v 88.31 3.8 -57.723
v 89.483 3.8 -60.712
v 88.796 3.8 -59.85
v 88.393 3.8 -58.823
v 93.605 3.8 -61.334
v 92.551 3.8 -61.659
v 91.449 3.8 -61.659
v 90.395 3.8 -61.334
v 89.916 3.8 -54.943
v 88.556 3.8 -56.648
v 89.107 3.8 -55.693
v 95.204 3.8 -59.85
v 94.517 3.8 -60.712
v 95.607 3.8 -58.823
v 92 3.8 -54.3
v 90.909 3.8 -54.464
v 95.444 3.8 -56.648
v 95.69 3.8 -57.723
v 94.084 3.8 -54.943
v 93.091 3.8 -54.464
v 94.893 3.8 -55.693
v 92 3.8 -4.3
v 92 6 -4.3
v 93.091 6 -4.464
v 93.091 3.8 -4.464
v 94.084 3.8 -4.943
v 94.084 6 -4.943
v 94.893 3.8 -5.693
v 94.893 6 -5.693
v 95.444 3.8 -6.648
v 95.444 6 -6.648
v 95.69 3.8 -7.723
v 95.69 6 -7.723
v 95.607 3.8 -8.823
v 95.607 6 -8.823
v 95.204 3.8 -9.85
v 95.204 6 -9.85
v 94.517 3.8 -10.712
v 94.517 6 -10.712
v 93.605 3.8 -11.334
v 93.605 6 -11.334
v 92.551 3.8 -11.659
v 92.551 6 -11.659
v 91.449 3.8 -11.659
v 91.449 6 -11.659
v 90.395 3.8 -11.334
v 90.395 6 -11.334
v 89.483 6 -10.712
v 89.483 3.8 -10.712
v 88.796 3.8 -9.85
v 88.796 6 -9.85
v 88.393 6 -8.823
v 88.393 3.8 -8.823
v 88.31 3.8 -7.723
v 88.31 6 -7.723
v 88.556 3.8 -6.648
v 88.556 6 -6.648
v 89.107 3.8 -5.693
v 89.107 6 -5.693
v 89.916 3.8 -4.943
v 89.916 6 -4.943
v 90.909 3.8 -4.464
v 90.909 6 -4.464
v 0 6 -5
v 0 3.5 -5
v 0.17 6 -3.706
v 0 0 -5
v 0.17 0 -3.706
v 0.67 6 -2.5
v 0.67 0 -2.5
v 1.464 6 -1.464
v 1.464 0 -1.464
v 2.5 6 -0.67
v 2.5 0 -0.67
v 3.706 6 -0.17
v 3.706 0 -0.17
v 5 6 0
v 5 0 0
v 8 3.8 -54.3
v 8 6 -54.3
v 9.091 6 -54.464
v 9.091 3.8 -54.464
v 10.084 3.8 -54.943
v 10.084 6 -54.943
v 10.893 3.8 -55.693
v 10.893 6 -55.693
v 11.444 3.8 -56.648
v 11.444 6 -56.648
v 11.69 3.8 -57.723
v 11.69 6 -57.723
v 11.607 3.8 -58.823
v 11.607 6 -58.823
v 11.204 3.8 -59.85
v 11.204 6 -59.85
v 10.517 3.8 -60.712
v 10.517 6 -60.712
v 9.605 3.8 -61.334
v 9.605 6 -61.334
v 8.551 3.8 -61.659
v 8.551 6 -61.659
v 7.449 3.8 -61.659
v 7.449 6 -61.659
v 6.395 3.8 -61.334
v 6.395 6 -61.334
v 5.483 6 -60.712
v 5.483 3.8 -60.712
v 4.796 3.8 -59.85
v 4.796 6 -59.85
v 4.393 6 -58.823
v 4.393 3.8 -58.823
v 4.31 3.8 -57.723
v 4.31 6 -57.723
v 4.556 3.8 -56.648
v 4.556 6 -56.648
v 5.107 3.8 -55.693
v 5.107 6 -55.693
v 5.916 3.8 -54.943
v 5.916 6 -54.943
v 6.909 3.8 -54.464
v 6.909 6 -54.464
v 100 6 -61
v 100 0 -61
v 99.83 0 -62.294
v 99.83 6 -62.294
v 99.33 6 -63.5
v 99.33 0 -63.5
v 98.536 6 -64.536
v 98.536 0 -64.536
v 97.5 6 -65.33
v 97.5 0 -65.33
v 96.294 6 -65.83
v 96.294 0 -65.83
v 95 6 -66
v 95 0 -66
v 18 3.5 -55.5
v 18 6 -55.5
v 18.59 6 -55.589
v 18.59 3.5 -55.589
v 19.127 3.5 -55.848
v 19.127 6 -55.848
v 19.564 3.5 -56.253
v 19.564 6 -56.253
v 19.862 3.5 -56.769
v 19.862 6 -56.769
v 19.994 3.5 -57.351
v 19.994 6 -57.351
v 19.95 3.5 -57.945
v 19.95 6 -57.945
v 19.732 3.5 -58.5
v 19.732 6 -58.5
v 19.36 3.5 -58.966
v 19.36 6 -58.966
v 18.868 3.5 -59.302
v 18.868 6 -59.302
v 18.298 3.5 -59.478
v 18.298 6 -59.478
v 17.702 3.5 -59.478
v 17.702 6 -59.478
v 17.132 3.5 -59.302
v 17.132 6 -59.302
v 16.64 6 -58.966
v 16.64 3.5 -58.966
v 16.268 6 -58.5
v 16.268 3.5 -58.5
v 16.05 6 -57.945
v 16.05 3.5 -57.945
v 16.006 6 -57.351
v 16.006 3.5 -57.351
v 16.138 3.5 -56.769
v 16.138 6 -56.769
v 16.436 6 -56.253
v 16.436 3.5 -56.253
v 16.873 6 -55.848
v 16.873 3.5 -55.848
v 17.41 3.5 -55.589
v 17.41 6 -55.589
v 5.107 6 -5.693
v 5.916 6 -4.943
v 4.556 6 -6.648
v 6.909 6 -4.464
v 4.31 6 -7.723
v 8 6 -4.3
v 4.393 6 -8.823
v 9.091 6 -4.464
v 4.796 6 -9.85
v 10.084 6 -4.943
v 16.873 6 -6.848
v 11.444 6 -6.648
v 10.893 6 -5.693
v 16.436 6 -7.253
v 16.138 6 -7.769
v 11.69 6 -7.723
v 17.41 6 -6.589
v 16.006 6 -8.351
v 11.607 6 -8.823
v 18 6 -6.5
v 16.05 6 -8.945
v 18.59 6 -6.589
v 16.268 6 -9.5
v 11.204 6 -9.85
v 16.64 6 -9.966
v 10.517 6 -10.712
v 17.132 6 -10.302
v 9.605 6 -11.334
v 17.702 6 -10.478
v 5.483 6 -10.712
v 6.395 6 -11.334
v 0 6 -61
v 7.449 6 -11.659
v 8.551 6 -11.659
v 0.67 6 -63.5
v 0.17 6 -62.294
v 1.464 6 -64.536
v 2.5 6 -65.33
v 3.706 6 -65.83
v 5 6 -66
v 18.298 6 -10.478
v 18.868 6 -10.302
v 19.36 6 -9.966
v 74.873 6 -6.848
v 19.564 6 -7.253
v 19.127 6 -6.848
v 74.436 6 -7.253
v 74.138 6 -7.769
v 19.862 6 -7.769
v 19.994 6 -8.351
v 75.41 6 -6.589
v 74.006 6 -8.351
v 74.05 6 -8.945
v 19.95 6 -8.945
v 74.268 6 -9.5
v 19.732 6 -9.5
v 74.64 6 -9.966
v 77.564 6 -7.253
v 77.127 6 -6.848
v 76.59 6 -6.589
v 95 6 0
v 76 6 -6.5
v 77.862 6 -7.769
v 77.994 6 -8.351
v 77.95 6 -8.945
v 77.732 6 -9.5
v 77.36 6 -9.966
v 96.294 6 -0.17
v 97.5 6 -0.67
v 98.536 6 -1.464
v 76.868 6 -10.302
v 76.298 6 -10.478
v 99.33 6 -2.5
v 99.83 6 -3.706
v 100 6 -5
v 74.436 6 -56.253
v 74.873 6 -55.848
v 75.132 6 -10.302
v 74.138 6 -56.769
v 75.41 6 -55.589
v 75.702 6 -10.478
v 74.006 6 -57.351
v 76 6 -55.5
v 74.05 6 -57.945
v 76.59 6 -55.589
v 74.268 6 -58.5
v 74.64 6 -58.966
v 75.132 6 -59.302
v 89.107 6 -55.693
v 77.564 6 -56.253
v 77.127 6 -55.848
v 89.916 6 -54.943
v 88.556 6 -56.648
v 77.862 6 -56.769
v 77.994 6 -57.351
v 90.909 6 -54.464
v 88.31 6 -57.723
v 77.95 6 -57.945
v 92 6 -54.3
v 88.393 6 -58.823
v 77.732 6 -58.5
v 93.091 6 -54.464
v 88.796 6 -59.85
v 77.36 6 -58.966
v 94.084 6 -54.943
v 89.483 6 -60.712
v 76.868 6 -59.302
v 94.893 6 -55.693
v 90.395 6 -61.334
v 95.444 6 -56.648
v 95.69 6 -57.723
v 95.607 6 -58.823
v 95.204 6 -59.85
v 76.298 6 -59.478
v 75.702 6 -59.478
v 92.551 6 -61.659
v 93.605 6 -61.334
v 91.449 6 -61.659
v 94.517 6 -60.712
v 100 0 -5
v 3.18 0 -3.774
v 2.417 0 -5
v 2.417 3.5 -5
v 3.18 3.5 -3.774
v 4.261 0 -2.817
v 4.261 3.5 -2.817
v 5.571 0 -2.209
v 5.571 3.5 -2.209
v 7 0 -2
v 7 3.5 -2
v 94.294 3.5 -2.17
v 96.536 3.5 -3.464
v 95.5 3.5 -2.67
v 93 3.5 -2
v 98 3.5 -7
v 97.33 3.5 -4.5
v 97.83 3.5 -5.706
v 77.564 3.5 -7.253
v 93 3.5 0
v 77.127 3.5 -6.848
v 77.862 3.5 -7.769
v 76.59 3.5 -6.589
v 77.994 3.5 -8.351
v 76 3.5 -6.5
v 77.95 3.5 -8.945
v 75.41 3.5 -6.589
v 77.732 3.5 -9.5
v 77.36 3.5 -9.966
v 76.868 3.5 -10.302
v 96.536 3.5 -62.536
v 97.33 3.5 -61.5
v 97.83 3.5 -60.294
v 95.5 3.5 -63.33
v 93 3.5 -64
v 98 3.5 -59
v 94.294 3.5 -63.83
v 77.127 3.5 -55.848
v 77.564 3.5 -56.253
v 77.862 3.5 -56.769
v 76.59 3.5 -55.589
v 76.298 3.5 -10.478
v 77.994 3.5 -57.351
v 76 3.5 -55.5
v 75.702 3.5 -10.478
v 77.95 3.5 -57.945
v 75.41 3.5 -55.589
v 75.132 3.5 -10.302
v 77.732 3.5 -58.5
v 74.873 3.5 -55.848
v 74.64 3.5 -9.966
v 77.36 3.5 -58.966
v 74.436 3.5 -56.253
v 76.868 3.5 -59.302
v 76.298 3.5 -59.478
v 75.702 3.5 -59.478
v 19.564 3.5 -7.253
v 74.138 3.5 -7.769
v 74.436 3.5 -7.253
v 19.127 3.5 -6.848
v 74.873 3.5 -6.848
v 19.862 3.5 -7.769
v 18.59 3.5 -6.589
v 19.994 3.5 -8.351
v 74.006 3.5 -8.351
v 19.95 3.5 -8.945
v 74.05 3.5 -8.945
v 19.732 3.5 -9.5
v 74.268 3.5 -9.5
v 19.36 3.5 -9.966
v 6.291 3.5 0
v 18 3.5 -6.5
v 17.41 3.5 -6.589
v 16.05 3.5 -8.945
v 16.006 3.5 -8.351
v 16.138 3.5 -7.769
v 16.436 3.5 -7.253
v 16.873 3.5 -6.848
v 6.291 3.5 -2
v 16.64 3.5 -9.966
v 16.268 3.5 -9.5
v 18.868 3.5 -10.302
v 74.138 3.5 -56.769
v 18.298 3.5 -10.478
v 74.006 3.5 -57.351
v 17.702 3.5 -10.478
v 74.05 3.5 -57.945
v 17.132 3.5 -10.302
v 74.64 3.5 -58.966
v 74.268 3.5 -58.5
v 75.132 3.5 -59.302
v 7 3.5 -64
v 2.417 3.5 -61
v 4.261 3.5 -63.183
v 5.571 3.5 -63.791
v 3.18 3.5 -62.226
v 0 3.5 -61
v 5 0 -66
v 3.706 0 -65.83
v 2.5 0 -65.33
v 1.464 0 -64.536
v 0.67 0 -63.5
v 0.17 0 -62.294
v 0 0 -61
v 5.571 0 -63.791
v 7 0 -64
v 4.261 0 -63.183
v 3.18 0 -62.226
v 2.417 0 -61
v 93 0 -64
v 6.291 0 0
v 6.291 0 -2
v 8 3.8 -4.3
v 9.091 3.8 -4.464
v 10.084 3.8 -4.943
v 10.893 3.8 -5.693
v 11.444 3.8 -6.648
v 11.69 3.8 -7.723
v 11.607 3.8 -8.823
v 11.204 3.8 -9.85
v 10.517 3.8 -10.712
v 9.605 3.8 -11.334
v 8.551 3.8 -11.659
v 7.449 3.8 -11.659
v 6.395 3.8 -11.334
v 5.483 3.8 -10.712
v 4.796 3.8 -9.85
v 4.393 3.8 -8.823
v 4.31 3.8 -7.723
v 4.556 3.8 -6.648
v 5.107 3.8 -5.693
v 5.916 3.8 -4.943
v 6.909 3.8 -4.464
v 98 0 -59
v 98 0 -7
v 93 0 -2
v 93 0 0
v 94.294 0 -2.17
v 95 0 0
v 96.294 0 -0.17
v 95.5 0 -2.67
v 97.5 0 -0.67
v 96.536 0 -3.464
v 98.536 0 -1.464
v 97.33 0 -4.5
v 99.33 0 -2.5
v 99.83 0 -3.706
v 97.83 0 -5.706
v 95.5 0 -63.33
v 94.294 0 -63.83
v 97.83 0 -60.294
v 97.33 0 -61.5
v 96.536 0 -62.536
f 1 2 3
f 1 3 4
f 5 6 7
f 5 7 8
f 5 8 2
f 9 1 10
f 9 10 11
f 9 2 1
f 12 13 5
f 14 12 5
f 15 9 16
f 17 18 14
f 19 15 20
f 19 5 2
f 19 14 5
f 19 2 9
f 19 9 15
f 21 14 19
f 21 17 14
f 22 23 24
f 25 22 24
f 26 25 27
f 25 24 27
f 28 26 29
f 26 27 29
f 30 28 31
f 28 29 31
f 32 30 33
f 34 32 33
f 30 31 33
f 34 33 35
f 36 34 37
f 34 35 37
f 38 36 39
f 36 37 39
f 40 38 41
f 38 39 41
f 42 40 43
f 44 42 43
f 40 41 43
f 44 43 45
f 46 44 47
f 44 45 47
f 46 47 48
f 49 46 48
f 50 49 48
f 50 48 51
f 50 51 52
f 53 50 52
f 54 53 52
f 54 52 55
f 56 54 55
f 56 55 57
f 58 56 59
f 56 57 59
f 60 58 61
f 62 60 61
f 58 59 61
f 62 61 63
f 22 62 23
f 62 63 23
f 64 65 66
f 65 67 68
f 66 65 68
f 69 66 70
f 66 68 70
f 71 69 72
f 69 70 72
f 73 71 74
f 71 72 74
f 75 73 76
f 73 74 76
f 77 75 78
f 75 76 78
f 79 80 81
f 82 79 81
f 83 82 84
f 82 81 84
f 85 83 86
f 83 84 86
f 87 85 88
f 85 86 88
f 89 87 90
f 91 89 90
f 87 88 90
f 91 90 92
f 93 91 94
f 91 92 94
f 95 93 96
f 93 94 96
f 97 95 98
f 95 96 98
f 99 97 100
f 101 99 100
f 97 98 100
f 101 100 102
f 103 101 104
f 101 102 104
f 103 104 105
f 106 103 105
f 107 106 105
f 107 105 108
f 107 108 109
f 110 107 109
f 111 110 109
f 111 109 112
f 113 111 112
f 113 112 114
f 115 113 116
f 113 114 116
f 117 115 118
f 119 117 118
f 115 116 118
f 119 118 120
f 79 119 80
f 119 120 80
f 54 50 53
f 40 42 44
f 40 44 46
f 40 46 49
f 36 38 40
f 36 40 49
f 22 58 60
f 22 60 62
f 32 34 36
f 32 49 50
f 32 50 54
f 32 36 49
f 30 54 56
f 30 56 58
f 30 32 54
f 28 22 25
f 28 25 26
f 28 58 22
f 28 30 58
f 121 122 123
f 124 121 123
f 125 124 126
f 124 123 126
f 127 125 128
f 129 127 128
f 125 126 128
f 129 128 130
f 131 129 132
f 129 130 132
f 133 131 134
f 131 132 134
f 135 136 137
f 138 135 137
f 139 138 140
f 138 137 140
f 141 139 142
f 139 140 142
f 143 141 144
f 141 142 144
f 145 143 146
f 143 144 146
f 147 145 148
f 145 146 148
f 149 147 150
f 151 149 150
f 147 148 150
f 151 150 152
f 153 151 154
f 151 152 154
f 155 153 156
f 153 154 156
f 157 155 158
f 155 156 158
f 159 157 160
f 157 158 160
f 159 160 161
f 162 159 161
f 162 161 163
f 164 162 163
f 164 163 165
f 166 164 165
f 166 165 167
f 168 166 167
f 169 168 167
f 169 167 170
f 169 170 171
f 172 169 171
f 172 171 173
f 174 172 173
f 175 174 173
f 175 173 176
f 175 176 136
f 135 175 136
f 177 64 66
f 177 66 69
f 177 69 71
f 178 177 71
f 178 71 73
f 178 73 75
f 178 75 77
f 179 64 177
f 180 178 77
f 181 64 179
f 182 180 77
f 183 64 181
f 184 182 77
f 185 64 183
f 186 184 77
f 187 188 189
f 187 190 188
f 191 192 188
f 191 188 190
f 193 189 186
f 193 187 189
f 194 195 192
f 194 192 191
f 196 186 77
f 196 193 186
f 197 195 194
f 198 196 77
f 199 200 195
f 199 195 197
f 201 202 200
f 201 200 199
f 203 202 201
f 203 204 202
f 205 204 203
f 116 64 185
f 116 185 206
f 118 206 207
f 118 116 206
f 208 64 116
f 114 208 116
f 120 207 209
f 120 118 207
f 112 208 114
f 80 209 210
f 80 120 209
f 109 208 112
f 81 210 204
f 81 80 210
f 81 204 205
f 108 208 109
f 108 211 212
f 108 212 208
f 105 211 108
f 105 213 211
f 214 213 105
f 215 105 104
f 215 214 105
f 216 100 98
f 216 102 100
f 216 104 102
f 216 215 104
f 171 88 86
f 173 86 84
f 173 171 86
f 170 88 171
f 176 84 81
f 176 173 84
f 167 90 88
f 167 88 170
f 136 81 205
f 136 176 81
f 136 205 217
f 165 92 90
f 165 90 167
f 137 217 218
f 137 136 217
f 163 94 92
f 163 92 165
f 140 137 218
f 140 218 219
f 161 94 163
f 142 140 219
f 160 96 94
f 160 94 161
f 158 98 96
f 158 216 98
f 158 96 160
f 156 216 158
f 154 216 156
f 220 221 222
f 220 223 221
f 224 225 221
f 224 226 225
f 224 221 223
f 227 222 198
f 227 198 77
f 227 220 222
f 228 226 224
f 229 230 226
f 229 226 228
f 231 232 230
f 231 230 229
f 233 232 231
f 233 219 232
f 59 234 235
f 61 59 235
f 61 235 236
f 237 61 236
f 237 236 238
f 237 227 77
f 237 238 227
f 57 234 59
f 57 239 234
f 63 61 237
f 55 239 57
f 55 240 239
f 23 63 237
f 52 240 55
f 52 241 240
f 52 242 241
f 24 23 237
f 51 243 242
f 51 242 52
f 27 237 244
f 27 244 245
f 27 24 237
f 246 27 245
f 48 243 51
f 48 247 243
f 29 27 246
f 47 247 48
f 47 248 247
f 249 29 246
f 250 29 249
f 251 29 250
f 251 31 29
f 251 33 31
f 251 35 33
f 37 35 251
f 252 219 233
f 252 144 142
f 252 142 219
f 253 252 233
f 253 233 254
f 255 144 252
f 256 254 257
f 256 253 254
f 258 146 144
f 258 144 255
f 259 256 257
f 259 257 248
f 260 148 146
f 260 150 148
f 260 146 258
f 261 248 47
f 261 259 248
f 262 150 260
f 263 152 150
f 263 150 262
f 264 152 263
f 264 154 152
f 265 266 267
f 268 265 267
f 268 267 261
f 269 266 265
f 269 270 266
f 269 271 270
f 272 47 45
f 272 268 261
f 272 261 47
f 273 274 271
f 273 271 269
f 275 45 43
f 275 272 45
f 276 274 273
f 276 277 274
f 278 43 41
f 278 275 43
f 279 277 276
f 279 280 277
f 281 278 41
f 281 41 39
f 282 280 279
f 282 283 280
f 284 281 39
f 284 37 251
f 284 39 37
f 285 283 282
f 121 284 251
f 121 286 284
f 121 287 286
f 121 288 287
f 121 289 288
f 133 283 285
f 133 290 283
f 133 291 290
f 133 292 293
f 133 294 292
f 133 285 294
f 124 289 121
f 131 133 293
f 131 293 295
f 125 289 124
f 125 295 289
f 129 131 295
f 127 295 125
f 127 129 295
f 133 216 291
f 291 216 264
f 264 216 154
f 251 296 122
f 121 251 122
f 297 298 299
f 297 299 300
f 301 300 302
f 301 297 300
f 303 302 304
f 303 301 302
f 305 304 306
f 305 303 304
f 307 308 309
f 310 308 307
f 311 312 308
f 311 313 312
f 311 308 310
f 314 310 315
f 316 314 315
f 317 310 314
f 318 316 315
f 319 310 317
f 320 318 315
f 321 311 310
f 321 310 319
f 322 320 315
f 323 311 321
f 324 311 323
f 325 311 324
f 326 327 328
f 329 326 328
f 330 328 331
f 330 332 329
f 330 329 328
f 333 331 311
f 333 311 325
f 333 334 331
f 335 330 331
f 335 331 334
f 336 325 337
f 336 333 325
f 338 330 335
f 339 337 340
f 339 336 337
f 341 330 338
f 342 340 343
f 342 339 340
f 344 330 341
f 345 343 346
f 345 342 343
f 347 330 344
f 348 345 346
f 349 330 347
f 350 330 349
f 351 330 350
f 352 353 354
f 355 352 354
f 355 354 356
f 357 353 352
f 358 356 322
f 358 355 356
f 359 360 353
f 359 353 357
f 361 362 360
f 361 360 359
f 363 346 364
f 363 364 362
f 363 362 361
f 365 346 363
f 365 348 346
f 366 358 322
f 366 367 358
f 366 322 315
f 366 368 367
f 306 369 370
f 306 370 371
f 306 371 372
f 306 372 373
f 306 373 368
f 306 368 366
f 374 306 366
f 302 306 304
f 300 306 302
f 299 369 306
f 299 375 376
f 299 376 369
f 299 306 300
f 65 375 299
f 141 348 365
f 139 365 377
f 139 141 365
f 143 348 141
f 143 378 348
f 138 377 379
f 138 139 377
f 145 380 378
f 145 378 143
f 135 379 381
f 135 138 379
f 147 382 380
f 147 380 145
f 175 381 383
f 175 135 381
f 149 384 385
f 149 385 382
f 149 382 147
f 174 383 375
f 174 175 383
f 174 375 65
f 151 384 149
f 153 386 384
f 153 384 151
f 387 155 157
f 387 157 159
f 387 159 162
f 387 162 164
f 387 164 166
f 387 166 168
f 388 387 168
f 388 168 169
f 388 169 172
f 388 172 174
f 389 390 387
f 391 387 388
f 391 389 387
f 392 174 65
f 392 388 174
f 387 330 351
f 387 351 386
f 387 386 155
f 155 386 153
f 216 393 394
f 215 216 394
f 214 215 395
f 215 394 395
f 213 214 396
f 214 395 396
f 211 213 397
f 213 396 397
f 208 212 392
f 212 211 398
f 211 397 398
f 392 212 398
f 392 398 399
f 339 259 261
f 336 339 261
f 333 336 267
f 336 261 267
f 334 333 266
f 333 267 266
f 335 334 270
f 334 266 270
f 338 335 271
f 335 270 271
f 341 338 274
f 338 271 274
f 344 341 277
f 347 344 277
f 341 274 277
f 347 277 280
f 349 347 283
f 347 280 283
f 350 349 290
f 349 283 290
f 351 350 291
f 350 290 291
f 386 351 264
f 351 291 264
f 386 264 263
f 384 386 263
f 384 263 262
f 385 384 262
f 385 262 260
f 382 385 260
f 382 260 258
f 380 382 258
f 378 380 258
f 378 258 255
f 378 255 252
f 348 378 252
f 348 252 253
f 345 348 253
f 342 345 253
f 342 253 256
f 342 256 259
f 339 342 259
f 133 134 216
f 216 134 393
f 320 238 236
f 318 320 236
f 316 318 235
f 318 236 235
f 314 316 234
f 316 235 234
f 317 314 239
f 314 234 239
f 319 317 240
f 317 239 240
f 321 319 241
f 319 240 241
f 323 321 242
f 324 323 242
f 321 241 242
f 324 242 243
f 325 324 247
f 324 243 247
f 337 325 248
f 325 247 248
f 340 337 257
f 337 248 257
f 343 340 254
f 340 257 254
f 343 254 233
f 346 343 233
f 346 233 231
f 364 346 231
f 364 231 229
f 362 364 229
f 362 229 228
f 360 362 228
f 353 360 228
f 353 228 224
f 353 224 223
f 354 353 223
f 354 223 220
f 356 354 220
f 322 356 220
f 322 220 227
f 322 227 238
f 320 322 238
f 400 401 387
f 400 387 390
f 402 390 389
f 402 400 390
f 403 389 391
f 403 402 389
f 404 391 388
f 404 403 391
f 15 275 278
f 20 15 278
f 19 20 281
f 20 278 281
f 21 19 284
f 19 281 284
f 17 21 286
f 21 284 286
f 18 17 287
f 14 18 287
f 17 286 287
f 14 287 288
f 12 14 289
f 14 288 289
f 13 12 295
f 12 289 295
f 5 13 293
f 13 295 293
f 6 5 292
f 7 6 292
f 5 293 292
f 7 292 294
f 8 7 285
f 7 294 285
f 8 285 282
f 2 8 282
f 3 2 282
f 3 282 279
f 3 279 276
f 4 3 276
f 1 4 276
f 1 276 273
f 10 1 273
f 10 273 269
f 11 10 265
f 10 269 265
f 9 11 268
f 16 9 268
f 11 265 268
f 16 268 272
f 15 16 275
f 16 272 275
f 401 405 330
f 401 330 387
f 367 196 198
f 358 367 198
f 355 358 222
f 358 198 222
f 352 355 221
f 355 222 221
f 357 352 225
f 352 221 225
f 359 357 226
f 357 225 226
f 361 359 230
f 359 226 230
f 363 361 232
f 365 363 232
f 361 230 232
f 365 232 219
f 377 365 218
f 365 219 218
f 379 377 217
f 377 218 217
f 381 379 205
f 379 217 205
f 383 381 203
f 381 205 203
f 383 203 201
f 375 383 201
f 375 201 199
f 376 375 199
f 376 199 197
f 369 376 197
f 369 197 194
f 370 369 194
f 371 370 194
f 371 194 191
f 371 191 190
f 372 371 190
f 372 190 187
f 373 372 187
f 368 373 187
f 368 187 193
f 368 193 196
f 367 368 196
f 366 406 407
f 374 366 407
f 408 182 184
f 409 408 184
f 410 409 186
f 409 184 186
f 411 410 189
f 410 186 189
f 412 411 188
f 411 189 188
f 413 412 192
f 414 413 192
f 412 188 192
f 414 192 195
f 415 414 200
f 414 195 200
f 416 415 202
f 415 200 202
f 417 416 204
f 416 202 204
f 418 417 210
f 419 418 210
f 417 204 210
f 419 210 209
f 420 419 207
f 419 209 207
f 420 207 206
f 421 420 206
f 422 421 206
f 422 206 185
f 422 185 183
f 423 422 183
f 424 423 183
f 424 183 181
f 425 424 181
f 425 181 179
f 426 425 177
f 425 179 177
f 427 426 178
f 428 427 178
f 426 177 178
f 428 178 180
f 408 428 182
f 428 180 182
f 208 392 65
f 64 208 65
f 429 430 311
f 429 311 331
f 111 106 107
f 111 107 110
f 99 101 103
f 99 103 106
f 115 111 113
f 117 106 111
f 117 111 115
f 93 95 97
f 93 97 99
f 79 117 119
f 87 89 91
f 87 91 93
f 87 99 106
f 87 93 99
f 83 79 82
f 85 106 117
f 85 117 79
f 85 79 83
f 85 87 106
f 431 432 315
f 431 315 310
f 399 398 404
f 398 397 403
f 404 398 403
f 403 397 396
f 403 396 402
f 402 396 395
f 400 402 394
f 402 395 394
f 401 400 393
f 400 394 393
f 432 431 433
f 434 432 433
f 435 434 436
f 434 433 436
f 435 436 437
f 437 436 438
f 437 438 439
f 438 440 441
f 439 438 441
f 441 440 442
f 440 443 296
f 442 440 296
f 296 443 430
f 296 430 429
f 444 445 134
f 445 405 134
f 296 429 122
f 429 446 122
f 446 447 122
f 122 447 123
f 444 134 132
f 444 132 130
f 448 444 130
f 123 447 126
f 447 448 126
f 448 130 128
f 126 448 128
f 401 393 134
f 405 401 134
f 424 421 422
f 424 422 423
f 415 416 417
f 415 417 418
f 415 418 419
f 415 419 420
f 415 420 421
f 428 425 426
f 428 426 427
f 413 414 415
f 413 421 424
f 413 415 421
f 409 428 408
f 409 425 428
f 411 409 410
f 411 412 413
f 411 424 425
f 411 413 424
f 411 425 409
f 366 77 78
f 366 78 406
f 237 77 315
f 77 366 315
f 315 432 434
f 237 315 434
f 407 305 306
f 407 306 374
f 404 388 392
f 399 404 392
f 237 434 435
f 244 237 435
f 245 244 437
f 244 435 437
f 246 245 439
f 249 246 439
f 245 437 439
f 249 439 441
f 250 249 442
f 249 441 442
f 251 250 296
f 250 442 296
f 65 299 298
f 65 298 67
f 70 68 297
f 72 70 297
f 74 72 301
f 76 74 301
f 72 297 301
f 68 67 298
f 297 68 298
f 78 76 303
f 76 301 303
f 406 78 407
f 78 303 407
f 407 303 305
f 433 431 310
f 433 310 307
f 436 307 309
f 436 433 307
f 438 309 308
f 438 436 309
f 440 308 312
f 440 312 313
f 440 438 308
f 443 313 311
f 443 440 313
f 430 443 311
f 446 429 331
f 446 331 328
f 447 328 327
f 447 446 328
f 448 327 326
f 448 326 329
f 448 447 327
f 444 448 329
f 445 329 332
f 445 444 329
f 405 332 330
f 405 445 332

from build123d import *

# Parameters (mm, degrees)
BOSS_EXTRUDE2_DEPTH = 6
CUT_EXTRUDE1_DEPTH  = 3.5
SKETCH5_R           = 3.7
CUT_EXTRUDE2_DEPTH  = 2.2
SKETCH6_R           = 2
CUT_EXTRUDE3_DEPTH  = 120.966662036
SKETCH11_W          = 2.417424305
SKETCH11_H          = 56
SKETCH11_W_2        = 86.709228263
SKETCH11_H_2        = 2
CUT_EXTRUDE7_DEPTH  = 3.5


with BuildPart() as part:
    # Sketch1 → Boss-Extrude2 (new body)
    with BuildSketch(Plane(origin=(0, 0, 0), x_dir=(1, 0, 0), z_dir=(0, 1, 0))):
        with BuildLine():
            Line((5, 0), (95, 0))
            ThreePointArc((95, 0), (98.535533906, 1.464466094), (100, 5))
            Line((100, 5), (100, 61))
            ThreePointArc((100, 61), (98.535533906, 64.535533906), (95, 66))
            Line((95, 66), (5, 66))
            ThreePointArc((5, 66), (1.464466094, 64.535533906), (0, 61))
            Line((0, 61), (0, 5))
            ThreePointArc((0, 5), (1.464466094, 1.464466094), (5, 0))
        make_face()
    extrude(amount=BOSS_EXTRUDE2_DEPTH)

    # Sketch2 → Cut-Extrude1 (cut)
    with BuildSketch(Plane.XZ):
        with BuildLine():
            Line((7, -2), (93, -2))
            ThreePointArc((93, -2), (96.535533906, -3.464466094), (98, -7))
            Line((98, -7), (98, -59))
            ThreePointArc((98, -59), (96.535533906, -62.535533906), (93, -64))
            Line((93, -64), (7, -64))
            ThreePointArc((7, -64), (3.464466094, -62.535533906), (2, -59))
            Line((2, -59), (2, -7))
            ThreePointArc((2, -7), (3.464466094, -3.464466094), (7, -2))
        make_face()
    extrude(amount=-CUT_EXTRUDE1_DEPTH, mode=Mode.SUBTRACT)

    # Sketch5 → Cut-Extrude2 (cut)
    with BuildSketch(Plane(origin=(0, 6, 0), x_dir=(1, 0, 0), z_dir=(0, 1, 0))):
        with Locations(Location((8, 58, 0), (0, 0, 270))):
            Circle(SKETCH5_R)
        with Locations(Location((8, 8, 0), (0, 0, 270))):
            Circle(SKETCH5_R)
        with Locations(Location((92, 58, 0), (0, 0, 270))):
            Circle(SKETCH5_R)
        with Locations(Location((92, 8, 0), (0, 0, 270))):
            Circle(SKETCH5_R)
    extrude(amount=-CUT_EXTRUDE2_DEPTH, mode=Mode.SUBTRACT)

    # Sketch6 → Cut-Extrude3 (cut, through all)
    with BuildSketch(Plane(origin=(0, 6, 0), x_dir=(1, 0, 0), z_dir=(0, 1, 0))):
        with Locations(Location((18, 57.5, 0), (0, 0, 270))):
            Circle(SKETCH6_R)
        with Locations(Location((18, 8.5, 0), (0, 0, 270))):
            Circle(SKETCH6_R)
        with Locations(Location((76, 57.5, 0), (0, 0, 270))):
            Circle(SKETCH6_R)
        with Locations(Location((76, 8.5, 0), (0, 0, 270))):
            Circle(SKETCH6_R)
    extrude(amount=-CUT_EXTRUDE3_DEPTH, mode=Mode.SUBTRACT)

    # Sketch11 → Cut-Extrude7 (cut)
    with BuildSketch(Plane(origin=(0, 0, 0), x_dir=(-1, 0, 0), z_dir=(0, -1, 0))):
        with Locations((-1.208712152, 33)):
            Rectangle(SKETCH11_W, SKETCH11_H)
        with Locations((-49.645385869, 1)):
            Rectangle(SKETCH11_W_2, SKETCH11_H_2)
    extrude(amount=-CUT_EXTRUDE7_DEPTH, mode=Mode.SUBTRACT)


solid = part.part
